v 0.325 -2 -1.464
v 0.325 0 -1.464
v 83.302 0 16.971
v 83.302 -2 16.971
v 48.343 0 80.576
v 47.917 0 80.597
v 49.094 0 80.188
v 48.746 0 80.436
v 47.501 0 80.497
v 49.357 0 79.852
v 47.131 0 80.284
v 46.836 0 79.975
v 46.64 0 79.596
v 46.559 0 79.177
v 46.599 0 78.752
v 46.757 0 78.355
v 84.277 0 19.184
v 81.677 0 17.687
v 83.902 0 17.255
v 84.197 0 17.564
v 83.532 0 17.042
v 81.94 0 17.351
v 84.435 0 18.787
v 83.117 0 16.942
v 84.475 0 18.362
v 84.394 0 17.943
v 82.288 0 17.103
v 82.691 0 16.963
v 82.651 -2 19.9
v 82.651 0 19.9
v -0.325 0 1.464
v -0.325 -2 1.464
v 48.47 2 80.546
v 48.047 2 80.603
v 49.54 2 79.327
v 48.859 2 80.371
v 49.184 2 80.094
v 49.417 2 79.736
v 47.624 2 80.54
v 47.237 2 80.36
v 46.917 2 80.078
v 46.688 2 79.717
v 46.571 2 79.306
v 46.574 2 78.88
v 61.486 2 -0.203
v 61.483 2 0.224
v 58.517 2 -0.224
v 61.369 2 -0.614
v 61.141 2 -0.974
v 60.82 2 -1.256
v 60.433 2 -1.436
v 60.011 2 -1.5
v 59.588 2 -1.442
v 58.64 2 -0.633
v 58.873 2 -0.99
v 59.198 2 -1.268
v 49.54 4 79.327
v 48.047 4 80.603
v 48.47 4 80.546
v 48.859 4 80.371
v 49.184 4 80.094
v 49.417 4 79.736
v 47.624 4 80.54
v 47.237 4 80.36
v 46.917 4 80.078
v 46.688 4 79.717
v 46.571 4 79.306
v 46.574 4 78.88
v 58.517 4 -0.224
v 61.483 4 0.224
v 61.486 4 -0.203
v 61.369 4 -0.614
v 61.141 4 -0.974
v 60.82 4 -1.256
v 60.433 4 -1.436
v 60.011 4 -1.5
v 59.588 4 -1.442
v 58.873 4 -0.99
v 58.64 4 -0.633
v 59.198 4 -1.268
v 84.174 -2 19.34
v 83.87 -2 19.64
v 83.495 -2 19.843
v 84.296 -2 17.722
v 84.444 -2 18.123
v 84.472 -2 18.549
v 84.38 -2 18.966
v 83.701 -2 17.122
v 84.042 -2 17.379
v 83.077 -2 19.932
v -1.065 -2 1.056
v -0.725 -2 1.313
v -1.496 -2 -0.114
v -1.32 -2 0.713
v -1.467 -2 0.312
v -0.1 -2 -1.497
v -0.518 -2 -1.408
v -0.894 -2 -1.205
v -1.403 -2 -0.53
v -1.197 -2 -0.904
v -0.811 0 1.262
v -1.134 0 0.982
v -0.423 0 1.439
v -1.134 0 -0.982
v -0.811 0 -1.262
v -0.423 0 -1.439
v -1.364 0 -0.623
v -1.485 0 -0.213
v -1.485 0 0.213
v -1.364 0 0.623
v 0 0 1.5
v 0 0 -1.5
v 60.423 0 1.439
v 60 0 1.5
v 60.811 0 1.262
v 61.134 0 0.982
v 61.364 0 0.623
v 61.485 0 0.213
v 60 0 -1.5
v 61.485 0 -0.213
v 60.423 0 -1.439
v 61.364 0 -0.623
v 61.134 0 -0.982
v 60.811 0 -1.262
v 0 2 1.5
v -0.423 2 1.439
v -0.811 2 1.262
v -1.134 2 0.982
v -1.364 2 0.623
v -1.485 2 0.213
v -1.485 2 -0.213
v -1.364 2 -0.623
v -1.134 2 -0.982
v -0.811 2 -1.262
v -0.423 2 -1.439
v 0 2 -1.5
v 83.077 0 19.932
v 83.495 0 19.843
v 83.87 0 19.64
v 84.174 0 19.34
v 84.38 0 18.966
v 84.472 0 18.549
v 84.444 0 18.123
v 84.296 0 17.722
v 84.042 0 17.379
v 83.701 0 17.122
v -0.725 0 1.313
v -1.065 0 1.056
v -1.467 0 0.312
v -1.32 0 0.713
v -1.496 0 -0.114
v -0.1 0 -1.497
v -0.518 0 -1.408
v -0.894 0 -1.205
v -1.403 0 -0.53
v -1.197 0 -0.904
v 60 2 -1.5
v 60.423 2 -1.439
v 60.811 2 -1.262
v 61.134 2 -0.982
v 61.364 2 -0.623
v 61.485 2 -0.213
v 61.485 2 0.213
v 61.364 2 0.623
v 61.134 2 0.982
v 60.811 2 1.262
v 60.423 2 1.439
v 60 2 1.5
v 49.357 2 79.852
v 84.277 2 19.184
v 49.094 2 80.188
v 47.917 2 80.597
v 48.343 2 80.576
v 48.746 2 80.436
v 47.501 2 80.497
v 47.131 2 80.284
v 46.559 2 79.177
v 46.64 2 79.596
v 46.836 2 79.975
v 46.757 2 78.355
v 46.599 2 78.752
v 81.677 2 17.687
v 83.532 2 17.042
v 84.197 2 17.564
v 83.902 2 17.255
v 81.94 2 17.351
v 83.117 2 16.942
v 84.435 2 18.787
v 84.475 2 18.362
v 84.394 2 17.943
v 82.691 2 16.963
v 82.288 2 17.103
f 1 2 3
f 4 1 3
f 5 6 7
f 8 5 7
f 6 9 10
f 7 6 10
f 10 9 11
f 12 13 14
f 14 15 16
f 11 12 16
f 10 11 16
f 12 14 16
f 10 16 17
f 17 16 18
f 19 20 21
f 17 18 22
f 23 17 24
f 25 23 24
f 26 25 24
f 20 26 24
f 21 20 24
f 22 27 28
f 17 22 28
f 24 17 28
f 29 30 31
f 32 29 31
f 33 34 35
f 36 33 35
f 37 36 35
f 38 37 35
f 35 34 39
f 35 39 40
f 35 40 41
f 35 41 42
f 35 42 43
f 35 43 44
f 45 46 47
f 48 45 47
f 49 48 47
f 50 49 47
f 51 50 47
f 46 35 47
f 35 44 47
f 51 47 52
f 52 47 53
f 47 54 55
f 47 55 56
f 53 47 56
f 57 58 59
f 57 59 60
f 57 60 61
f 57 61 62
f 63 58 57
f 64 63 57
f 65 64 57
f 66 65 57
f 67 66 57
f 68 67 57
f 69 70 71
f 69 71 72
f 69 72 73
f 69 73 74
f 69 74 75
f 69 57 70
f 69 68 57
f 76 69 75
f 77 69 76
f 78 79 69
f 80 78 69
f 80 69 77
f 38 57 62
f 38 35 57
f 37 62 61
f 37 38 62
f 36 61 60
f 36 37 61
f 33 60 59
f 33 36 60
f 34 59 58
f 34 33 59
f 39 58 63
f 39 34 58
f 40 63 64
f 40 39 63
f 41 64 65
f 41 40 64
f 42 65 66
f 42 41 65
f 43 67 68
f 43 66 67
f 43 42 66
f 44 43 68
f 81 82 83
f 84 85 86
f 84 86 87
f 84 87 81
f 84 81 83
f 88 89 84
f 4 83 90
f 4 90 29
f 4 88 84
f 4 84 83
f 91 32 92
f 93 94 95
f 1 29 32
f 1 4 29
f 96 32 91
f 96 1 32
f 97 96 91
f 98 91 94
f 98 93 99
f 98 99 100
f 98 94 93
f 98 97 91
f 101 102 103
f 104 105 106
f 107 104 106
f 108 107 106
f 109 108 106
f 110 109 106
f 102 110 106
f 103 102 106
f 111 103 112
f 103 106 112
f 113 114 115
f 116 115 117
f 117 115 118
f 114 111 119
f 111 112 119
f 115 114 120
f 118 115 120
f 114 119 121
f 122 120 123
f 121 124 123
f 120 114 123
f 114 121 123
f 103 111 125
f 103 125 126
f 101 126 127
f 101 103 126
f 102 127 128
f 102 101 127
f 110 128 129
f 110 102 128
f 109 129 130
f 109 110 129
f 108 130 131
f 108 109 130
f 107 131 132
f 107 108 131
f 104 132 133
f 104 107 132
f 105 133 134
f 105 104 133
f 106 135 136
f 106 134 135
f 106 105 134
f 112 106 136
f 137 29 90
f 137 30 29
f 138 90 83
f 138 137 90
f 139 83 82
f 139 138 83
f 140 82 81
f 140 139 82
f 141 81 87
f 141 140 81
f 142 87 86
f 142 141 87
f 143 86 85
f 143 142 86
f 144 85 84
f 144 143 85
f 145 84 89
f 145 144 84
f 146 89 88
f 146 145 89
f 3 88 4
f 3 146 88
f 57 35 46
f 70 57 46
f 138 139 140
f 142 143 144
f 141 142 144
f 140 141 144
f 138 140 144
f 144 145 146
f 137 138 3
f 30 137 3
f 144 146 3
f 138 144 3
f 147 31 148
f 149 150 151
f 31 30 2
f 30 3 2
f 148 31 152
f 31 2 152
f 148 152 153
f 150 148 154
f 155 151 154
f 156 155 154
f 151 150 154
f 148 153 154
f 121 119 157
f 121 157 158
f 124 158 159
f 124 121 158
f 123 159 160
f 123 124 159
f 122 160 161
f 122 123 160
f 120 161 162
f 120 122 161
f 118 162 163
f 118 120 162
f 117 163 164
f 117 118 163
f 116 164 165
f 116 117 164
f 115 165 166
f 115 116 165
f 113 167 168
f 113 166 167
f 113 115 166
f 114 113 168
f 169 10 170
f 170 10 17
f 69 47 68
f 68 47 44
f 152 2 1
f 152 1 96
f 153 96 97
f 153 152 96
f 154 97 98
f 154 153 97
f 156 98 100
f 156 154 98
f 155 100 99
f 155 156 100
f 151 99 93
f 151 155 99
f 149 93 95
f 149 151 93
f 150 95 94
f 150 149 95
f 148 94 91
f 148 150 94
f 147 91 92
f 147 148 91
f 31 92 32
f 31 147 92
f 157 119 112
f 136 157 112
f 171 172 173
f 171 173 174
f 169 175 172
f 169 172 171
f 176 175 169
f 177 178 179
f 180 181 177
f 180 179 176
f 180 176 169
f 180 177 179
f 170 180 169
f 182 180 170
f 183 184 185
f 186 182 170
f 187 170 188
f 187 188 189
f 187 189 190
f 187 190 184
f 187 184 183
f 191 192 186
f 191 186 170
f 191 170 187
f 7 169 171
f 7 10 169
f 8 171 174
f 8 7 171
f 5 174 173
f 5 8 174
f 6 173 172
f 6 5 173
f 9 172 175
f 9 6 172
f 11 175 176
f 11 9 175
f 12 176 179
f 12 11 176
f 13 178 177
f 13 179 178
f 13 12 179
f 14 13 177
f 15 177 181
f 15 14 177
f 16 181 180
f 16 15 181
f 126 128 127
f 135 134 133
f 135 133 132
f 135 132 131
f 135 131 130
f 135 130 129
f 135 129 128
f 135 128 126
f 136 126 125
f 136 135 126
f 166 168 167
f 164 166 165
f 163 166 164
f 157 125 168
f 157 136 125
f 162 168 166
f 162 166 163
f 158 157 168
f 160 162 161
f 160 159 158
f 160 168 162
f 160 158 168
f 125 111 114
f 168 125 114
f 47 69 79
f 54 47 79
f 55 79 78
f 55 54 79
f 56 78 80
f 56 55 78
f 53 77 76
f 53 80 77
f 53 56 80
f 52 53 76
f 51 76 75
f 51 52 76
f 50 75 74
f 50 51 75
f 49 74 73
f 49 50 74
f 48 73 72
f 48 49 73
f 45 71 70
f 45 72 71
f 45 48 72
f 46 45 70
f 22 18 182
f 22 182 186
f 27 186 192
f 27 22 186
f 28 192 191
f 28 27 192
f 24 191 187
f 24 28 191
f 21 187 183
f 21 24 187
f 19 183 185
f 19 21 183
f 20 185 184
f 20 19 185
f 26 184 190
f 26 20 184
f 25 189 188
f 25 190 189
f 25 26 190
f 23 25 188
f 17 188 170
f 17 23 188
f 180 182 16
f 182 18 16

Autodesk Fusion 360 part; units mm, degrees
sketch "Sketch5" plane through (0, 0, 0) normal (0, 1, 0) x (1, 0, 0)
  line L0 (0, -1.5) -> (60, -1.5)
  arc A0 (60, -1.5) -> (60, 1.5) centre (60, 0) ccw
  line L1 (60, 1.5) -> (0, 1.5)
  arc A1 (0, 1.5) -> (0, -1.5) centre (0, 0) ccw
  line L2 (0, 0) -> (60, 0) construction
  arc A2 (0, -12.5) -> (0, -15.5) centre (0, -14) ccw
  line L3 (0, -14) -> (85, -14) construction
  line L4 (85, -12.5) -> (0, -12.5)
  line L5 (0, -15.5) -> (85, -15.5)
  arc A3 (85, -15.5) -> (85, -12.5) centre (85, -14) ccw
  arc A4 (80, -45.5) -> (80, -42.5) centre (80, -44) ccw
  arc A5 (70, -31.5) -> (70, -28.5) centre (70, -30) ccw
  line L6 (0, -31.5) -> (70, -31.5)
  line L7 (0, -45.5) -> (80, -45.5)
  line L8 (0, -30) -> (70, -30) construction
  line L9 (0, -44) -> (80, -44) construction
  arc A6 (0, -28.5) -> (0, -31.5) centre (0, -30) ccw
  line L10 (80, -42.5) -> (0, -42.5)
  line L11 (70, -28.5) -> (0, -28.5)
  arc A7 (0, -42.5) -> (0, -45.5) centre (0, -44) ccw
  dimension "d1" = 3
  dimension "d2" = 60
  dimension "d3" = 3
  dimension "d4" = 85
  dimension "d5" = 3
  dimension "d6" = 70
  dimension "d7" = 3
  dimension "d8" = 80
extrude "Extrude1" add sketch "Sketch5" along normal blind 2 makes body 1 at (28.3333, 0, 14.5) makes body 2 at (53.3333, 0, 44.5) makes body 3 at (40, 0, 0.5) makes body 4 at (23.3333, 0, 30.5)
copy_body "Body->Comp1" bodies 1 removing the originals makes body 5 in component "Component"
copy_body "Body->Comp2" bodies 2 removing the originals makes body 6 in component "Component'"
copy_body "Body->Comp3" bodies 3 removing the originals makes body 7 in component "Component''"
copy_body "Body->Comp4" bodies 4 removing the originals makes body 8 in component "Component'''"
sketch "Sketch1" plane through (0, 0, 0) normal (0, 1, 0) x (1, 0, 0)
  line L0 (0, 0) -> (28, 0)
sketch "Sketch2" plane through (0, 0, 0) normal (0, 1, 0) x (1, 0, 0)
  line L0 (28, 0) -> (42, -21)
sketch "Sketch3" plane through (0, 0, 0) normal (0, 1, 0) x (1, 0, 0)
  line L0 (42, -21) -> (-21, -21)
sketch "Sketch4" plane through (0, 0, 0) normal (0, 1, 0) x (1, 0, 0)
  line L0 (-23, -21) -> (0, 0)
component "Component" placed x (-0.976197, 0, -0.216887) y (0, -1, 0) z (-0.216887, 0, 0.976197) at (86.0131, 0, 4.7686)
component "Component'" placed x (0.149286, 0, -0.988794) y (0, 1, 0) z (0.988794, 0, 0.149286) at (4.5502, 2, 72.5349)
component "Component''" placed x (1, 0, 0) y (0, 1, 0) z (0, 0, 1) at (0, 0, 0)
component "Component'''" placed x (0.498852, 0, -0.866687) y (0, 1, 0) z (0.866687, 0, 0.498852) at (22.0565, 0, 64.138)
